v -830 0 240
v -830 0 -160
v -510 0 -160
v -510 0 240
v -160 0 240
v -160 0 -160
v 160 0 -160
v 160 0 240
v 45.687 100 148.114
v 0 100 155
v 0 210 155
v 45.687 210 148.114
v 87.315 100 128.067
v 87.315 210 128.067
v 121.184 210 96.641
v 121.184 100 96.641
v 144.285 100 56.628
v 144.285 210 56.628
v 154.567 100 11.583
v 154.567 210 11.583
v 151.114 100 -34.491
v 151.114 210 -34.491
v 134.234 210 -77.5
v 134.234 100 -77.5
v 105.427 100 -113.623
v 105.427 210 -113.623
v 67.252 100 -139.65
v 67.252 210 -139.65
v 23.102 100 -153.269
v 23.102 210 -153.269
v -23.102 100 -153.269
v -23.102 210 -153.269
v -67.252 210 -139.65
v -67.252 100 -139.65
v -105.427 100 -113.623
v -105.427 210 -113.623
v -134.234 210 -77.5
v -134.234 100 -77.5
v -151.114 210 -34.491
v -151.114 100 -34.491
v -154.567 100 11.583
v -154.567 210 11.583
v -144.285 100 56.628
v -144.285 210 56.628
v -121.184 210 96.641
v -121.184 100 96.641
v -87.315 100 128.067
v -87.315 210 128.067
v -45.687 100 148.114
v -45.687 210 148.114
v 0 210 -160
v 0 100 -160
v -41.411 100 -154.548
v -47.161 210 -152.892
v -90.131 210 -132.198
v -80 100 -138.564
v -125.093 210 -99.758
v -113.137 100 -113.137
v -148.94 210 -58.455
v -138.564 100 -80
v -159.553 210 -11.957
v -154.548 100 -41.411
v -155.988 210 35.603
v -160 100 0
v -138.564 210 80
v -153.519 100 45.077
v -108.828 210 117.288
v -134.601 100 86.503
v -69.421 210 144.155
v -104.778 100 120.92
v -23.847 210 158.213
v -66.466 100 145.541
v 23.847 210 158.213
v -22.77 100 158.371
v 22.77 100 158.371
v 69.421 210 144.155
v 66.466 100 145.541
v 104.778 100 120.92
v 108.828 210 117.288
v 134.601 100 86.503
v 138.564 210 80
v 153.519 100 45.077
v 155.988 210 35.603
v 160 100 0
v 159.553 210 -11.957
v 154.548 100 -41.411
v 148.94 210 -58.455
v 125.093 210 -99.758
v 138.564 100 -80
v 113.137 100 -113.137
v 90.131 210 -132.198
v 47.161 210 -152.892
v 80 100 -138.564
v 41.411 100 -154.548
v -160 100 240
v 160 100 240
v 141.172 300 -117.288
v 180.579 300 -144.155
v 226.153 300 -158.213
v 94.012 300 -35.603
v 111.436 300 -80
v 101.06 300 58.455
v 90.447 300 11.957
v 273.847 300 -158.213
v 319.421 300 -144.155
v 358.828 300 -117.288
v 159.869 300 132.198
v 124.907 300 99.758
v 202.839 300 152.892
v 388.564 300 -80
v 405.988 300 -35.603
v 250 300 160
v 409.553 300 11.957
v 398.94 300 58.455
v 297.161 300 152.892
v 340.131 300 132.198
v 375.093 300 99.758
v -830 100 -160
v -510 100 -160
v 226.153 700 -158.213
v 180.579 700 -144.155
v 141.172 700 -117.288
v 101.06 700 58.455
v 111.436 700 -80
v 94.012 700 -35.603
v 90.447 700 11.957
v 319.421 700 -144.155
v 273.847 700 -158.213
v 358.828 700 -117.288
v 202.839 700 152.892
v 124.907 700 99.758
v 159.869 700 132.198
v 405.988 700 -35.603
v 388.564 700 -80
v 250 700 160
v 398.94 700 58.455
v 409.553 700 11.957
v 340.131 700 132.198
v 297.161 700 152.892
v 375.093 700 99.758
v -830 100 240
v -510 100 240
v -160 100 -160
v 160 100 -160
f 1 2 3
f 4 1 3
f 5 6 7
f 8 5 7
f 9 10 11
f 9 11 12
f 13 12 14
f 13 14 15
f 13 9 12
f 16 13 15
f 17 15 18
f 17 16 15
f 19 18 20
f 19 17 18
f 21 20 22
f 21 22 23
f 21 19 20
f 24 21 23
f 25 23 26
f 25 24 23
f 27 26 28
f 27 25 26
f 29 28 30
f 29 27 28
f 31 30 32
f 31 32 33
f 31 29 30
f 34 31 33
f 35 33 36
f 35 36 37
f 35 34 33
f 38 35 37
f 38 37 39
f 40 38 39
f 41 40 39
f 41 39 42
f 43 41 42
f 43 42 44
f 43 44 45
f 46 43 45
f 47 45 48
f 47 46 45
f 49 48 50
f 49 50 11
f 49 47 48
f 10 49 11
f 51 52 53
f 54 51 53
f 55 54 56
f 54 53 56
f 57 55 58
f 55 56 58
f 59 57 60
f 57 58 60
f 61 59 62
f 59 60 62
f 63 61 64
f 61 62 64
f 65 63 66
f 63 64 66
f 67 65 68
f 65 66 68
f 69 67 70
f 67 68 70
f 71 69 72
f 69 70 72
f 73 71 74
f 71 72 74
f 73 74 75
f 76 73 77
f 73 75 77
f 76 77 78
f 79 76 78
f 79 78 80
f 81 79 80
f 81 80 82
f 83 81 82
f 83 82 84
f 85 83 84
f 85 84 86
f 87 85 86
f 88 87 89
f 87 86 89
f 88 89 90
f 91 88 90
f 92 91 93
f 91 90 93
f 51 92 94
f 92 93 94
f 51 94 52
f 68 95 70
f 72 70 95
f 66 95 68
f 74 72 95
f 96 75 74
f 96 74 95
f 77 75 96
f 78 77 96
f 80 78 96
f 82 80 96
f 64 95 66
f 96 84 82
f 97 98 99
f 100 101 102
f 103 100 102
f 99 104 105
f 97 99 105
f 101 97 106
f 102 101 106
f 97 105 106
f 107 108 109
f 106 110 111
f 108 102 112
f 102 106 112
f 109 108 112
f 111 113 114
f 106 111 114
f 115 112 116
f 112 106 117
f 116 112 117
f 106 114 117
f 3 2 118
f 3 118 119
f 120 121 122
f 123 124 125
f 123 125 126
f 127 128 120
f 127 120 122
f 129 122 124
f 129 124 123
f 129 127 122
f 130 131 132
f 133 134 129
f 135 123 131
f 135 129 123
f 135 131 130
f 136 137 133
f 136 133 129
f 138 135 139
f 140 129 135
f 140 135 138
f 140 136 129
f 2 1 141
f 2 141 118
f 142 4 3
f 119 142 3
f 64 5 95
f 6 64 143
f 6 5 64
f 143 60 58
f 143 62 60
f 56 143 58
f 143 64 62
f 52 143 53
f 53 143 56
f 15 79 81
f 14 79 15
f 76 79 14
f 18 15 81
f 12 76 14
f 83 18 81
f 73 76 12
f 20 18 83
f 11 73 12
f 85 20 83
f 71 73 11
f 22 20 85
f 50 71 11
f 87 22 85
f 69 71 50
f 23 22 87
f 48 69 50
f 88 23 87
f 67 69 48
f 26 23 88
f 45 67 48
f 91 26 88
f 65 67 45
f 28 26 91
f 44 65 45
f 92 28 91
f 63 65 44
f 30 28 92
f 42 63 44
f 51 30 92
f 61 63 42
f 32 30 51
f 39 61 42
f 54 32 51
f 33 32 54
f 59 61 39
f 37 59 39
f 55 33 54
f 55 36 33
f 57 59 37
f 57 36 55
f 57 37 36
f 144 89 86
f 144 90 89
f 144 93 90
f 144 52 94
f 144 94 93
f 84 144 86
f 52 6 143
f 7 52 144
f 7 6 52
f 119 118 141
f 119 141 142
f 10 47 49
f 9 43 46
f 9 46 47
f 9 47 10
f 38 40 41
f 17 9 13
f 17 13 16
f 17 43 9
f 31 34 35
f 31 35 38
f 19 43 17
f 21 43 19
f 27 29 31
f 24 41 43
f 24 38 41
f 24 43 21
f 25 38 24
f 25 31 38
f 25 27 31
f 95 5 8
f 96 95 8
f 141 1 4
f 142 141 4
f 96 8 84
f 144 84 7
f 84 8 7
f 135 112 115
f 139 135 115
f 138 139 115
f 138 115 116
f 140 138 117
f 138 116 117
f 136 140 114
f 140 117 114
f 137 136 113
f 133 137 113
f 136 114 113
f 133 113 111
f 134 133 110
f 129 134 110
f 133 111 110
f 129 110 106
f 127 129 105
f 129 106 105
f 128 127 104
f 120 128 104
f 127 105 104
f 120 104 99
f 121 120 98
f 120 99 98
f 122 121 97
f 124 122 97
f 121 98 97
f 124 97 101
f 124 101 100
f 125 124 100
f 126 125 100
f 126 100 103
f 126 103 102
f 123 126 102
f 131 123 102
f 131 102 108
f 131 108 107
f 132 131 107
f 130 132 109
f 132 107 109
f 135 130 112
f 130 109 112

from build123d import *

# Parameters (mm, degrees)
SKETCH2_W             = 320
SKETCH2_H             = 400
BOSS_EXTRUDE1_DEPTH   = 100
BOSS_EXTRUDE1_2_DEPTH = 100
SKETCH4_R             = 160
SKETCH4_R_2           = 155
BOSS_EXTRUDE3_DEPTH   = 110
SKETCH5_R             = 160
BOSS_EXTRUDE4_DEPTH   = 400


with BuildPart() as part:
    # Sketch2 → Boss-Extrude1 (new body)
    with BuildSketch(Plane(origin=(0, 0, 0), x_dir=(1, 0, 0), z_dir=(0, 1, 0))):
        with Locations((-670, -40)):
            Rectangle(SKETCH2_W, SKETCH2_H)
    extrude(amount=BOSS_EXTRUDE1_DEPTH)


with BuildPart() as body_2:
    # Sketch2 → Boss-Extrude1 2 (new body)
    with BuildSketch(Plane(origin=(0, 0, 0), x_dir=(1, 0, 0), z_dir=(0, 1, 0))):
        with Locations((0, -40)):
            Rectangle(SKETCH2_W, SKETCH2_H)
    extrude(amount=BOSS_EXTRUDE1_2_DEPTH)

    # Sketch4 → Boss-Extrude3 (add)
    with BuildSketch(Plane(origin=(0, 100, 0), x_dir=(1, 0, 0), z_dir=(0, 1, 0))):
        with Locations(Location((0, 0, 0), (0, 0, 90))):
            Circle(SKETCH4_R)
        with Locations(Location((0, 0, 0), (0, 0, 270))):
            Circle(SKETCH4_R_2, mode=Mode.SUBTRACT)
    extrude(amount=BOSS_EXTRUDE3_DEPTH)


with BuildPart() as body_3:
    # Sketch5 → Boss-Extrude4 (new body)
    with BuildSketch(Plane(origin=(0, 300, 0), x_dir=(1, 0, 0), z_dir=(0, 1, 0))):
        with Locations(Location((250, 0, 0), (0, 0, 270))):
            Circle(SKETCH5_R)
    extrude(amount=BOSS_EXTRUDE4_DEPTH)


solid = Compound([part.part, body_2.part, body_3.part])
